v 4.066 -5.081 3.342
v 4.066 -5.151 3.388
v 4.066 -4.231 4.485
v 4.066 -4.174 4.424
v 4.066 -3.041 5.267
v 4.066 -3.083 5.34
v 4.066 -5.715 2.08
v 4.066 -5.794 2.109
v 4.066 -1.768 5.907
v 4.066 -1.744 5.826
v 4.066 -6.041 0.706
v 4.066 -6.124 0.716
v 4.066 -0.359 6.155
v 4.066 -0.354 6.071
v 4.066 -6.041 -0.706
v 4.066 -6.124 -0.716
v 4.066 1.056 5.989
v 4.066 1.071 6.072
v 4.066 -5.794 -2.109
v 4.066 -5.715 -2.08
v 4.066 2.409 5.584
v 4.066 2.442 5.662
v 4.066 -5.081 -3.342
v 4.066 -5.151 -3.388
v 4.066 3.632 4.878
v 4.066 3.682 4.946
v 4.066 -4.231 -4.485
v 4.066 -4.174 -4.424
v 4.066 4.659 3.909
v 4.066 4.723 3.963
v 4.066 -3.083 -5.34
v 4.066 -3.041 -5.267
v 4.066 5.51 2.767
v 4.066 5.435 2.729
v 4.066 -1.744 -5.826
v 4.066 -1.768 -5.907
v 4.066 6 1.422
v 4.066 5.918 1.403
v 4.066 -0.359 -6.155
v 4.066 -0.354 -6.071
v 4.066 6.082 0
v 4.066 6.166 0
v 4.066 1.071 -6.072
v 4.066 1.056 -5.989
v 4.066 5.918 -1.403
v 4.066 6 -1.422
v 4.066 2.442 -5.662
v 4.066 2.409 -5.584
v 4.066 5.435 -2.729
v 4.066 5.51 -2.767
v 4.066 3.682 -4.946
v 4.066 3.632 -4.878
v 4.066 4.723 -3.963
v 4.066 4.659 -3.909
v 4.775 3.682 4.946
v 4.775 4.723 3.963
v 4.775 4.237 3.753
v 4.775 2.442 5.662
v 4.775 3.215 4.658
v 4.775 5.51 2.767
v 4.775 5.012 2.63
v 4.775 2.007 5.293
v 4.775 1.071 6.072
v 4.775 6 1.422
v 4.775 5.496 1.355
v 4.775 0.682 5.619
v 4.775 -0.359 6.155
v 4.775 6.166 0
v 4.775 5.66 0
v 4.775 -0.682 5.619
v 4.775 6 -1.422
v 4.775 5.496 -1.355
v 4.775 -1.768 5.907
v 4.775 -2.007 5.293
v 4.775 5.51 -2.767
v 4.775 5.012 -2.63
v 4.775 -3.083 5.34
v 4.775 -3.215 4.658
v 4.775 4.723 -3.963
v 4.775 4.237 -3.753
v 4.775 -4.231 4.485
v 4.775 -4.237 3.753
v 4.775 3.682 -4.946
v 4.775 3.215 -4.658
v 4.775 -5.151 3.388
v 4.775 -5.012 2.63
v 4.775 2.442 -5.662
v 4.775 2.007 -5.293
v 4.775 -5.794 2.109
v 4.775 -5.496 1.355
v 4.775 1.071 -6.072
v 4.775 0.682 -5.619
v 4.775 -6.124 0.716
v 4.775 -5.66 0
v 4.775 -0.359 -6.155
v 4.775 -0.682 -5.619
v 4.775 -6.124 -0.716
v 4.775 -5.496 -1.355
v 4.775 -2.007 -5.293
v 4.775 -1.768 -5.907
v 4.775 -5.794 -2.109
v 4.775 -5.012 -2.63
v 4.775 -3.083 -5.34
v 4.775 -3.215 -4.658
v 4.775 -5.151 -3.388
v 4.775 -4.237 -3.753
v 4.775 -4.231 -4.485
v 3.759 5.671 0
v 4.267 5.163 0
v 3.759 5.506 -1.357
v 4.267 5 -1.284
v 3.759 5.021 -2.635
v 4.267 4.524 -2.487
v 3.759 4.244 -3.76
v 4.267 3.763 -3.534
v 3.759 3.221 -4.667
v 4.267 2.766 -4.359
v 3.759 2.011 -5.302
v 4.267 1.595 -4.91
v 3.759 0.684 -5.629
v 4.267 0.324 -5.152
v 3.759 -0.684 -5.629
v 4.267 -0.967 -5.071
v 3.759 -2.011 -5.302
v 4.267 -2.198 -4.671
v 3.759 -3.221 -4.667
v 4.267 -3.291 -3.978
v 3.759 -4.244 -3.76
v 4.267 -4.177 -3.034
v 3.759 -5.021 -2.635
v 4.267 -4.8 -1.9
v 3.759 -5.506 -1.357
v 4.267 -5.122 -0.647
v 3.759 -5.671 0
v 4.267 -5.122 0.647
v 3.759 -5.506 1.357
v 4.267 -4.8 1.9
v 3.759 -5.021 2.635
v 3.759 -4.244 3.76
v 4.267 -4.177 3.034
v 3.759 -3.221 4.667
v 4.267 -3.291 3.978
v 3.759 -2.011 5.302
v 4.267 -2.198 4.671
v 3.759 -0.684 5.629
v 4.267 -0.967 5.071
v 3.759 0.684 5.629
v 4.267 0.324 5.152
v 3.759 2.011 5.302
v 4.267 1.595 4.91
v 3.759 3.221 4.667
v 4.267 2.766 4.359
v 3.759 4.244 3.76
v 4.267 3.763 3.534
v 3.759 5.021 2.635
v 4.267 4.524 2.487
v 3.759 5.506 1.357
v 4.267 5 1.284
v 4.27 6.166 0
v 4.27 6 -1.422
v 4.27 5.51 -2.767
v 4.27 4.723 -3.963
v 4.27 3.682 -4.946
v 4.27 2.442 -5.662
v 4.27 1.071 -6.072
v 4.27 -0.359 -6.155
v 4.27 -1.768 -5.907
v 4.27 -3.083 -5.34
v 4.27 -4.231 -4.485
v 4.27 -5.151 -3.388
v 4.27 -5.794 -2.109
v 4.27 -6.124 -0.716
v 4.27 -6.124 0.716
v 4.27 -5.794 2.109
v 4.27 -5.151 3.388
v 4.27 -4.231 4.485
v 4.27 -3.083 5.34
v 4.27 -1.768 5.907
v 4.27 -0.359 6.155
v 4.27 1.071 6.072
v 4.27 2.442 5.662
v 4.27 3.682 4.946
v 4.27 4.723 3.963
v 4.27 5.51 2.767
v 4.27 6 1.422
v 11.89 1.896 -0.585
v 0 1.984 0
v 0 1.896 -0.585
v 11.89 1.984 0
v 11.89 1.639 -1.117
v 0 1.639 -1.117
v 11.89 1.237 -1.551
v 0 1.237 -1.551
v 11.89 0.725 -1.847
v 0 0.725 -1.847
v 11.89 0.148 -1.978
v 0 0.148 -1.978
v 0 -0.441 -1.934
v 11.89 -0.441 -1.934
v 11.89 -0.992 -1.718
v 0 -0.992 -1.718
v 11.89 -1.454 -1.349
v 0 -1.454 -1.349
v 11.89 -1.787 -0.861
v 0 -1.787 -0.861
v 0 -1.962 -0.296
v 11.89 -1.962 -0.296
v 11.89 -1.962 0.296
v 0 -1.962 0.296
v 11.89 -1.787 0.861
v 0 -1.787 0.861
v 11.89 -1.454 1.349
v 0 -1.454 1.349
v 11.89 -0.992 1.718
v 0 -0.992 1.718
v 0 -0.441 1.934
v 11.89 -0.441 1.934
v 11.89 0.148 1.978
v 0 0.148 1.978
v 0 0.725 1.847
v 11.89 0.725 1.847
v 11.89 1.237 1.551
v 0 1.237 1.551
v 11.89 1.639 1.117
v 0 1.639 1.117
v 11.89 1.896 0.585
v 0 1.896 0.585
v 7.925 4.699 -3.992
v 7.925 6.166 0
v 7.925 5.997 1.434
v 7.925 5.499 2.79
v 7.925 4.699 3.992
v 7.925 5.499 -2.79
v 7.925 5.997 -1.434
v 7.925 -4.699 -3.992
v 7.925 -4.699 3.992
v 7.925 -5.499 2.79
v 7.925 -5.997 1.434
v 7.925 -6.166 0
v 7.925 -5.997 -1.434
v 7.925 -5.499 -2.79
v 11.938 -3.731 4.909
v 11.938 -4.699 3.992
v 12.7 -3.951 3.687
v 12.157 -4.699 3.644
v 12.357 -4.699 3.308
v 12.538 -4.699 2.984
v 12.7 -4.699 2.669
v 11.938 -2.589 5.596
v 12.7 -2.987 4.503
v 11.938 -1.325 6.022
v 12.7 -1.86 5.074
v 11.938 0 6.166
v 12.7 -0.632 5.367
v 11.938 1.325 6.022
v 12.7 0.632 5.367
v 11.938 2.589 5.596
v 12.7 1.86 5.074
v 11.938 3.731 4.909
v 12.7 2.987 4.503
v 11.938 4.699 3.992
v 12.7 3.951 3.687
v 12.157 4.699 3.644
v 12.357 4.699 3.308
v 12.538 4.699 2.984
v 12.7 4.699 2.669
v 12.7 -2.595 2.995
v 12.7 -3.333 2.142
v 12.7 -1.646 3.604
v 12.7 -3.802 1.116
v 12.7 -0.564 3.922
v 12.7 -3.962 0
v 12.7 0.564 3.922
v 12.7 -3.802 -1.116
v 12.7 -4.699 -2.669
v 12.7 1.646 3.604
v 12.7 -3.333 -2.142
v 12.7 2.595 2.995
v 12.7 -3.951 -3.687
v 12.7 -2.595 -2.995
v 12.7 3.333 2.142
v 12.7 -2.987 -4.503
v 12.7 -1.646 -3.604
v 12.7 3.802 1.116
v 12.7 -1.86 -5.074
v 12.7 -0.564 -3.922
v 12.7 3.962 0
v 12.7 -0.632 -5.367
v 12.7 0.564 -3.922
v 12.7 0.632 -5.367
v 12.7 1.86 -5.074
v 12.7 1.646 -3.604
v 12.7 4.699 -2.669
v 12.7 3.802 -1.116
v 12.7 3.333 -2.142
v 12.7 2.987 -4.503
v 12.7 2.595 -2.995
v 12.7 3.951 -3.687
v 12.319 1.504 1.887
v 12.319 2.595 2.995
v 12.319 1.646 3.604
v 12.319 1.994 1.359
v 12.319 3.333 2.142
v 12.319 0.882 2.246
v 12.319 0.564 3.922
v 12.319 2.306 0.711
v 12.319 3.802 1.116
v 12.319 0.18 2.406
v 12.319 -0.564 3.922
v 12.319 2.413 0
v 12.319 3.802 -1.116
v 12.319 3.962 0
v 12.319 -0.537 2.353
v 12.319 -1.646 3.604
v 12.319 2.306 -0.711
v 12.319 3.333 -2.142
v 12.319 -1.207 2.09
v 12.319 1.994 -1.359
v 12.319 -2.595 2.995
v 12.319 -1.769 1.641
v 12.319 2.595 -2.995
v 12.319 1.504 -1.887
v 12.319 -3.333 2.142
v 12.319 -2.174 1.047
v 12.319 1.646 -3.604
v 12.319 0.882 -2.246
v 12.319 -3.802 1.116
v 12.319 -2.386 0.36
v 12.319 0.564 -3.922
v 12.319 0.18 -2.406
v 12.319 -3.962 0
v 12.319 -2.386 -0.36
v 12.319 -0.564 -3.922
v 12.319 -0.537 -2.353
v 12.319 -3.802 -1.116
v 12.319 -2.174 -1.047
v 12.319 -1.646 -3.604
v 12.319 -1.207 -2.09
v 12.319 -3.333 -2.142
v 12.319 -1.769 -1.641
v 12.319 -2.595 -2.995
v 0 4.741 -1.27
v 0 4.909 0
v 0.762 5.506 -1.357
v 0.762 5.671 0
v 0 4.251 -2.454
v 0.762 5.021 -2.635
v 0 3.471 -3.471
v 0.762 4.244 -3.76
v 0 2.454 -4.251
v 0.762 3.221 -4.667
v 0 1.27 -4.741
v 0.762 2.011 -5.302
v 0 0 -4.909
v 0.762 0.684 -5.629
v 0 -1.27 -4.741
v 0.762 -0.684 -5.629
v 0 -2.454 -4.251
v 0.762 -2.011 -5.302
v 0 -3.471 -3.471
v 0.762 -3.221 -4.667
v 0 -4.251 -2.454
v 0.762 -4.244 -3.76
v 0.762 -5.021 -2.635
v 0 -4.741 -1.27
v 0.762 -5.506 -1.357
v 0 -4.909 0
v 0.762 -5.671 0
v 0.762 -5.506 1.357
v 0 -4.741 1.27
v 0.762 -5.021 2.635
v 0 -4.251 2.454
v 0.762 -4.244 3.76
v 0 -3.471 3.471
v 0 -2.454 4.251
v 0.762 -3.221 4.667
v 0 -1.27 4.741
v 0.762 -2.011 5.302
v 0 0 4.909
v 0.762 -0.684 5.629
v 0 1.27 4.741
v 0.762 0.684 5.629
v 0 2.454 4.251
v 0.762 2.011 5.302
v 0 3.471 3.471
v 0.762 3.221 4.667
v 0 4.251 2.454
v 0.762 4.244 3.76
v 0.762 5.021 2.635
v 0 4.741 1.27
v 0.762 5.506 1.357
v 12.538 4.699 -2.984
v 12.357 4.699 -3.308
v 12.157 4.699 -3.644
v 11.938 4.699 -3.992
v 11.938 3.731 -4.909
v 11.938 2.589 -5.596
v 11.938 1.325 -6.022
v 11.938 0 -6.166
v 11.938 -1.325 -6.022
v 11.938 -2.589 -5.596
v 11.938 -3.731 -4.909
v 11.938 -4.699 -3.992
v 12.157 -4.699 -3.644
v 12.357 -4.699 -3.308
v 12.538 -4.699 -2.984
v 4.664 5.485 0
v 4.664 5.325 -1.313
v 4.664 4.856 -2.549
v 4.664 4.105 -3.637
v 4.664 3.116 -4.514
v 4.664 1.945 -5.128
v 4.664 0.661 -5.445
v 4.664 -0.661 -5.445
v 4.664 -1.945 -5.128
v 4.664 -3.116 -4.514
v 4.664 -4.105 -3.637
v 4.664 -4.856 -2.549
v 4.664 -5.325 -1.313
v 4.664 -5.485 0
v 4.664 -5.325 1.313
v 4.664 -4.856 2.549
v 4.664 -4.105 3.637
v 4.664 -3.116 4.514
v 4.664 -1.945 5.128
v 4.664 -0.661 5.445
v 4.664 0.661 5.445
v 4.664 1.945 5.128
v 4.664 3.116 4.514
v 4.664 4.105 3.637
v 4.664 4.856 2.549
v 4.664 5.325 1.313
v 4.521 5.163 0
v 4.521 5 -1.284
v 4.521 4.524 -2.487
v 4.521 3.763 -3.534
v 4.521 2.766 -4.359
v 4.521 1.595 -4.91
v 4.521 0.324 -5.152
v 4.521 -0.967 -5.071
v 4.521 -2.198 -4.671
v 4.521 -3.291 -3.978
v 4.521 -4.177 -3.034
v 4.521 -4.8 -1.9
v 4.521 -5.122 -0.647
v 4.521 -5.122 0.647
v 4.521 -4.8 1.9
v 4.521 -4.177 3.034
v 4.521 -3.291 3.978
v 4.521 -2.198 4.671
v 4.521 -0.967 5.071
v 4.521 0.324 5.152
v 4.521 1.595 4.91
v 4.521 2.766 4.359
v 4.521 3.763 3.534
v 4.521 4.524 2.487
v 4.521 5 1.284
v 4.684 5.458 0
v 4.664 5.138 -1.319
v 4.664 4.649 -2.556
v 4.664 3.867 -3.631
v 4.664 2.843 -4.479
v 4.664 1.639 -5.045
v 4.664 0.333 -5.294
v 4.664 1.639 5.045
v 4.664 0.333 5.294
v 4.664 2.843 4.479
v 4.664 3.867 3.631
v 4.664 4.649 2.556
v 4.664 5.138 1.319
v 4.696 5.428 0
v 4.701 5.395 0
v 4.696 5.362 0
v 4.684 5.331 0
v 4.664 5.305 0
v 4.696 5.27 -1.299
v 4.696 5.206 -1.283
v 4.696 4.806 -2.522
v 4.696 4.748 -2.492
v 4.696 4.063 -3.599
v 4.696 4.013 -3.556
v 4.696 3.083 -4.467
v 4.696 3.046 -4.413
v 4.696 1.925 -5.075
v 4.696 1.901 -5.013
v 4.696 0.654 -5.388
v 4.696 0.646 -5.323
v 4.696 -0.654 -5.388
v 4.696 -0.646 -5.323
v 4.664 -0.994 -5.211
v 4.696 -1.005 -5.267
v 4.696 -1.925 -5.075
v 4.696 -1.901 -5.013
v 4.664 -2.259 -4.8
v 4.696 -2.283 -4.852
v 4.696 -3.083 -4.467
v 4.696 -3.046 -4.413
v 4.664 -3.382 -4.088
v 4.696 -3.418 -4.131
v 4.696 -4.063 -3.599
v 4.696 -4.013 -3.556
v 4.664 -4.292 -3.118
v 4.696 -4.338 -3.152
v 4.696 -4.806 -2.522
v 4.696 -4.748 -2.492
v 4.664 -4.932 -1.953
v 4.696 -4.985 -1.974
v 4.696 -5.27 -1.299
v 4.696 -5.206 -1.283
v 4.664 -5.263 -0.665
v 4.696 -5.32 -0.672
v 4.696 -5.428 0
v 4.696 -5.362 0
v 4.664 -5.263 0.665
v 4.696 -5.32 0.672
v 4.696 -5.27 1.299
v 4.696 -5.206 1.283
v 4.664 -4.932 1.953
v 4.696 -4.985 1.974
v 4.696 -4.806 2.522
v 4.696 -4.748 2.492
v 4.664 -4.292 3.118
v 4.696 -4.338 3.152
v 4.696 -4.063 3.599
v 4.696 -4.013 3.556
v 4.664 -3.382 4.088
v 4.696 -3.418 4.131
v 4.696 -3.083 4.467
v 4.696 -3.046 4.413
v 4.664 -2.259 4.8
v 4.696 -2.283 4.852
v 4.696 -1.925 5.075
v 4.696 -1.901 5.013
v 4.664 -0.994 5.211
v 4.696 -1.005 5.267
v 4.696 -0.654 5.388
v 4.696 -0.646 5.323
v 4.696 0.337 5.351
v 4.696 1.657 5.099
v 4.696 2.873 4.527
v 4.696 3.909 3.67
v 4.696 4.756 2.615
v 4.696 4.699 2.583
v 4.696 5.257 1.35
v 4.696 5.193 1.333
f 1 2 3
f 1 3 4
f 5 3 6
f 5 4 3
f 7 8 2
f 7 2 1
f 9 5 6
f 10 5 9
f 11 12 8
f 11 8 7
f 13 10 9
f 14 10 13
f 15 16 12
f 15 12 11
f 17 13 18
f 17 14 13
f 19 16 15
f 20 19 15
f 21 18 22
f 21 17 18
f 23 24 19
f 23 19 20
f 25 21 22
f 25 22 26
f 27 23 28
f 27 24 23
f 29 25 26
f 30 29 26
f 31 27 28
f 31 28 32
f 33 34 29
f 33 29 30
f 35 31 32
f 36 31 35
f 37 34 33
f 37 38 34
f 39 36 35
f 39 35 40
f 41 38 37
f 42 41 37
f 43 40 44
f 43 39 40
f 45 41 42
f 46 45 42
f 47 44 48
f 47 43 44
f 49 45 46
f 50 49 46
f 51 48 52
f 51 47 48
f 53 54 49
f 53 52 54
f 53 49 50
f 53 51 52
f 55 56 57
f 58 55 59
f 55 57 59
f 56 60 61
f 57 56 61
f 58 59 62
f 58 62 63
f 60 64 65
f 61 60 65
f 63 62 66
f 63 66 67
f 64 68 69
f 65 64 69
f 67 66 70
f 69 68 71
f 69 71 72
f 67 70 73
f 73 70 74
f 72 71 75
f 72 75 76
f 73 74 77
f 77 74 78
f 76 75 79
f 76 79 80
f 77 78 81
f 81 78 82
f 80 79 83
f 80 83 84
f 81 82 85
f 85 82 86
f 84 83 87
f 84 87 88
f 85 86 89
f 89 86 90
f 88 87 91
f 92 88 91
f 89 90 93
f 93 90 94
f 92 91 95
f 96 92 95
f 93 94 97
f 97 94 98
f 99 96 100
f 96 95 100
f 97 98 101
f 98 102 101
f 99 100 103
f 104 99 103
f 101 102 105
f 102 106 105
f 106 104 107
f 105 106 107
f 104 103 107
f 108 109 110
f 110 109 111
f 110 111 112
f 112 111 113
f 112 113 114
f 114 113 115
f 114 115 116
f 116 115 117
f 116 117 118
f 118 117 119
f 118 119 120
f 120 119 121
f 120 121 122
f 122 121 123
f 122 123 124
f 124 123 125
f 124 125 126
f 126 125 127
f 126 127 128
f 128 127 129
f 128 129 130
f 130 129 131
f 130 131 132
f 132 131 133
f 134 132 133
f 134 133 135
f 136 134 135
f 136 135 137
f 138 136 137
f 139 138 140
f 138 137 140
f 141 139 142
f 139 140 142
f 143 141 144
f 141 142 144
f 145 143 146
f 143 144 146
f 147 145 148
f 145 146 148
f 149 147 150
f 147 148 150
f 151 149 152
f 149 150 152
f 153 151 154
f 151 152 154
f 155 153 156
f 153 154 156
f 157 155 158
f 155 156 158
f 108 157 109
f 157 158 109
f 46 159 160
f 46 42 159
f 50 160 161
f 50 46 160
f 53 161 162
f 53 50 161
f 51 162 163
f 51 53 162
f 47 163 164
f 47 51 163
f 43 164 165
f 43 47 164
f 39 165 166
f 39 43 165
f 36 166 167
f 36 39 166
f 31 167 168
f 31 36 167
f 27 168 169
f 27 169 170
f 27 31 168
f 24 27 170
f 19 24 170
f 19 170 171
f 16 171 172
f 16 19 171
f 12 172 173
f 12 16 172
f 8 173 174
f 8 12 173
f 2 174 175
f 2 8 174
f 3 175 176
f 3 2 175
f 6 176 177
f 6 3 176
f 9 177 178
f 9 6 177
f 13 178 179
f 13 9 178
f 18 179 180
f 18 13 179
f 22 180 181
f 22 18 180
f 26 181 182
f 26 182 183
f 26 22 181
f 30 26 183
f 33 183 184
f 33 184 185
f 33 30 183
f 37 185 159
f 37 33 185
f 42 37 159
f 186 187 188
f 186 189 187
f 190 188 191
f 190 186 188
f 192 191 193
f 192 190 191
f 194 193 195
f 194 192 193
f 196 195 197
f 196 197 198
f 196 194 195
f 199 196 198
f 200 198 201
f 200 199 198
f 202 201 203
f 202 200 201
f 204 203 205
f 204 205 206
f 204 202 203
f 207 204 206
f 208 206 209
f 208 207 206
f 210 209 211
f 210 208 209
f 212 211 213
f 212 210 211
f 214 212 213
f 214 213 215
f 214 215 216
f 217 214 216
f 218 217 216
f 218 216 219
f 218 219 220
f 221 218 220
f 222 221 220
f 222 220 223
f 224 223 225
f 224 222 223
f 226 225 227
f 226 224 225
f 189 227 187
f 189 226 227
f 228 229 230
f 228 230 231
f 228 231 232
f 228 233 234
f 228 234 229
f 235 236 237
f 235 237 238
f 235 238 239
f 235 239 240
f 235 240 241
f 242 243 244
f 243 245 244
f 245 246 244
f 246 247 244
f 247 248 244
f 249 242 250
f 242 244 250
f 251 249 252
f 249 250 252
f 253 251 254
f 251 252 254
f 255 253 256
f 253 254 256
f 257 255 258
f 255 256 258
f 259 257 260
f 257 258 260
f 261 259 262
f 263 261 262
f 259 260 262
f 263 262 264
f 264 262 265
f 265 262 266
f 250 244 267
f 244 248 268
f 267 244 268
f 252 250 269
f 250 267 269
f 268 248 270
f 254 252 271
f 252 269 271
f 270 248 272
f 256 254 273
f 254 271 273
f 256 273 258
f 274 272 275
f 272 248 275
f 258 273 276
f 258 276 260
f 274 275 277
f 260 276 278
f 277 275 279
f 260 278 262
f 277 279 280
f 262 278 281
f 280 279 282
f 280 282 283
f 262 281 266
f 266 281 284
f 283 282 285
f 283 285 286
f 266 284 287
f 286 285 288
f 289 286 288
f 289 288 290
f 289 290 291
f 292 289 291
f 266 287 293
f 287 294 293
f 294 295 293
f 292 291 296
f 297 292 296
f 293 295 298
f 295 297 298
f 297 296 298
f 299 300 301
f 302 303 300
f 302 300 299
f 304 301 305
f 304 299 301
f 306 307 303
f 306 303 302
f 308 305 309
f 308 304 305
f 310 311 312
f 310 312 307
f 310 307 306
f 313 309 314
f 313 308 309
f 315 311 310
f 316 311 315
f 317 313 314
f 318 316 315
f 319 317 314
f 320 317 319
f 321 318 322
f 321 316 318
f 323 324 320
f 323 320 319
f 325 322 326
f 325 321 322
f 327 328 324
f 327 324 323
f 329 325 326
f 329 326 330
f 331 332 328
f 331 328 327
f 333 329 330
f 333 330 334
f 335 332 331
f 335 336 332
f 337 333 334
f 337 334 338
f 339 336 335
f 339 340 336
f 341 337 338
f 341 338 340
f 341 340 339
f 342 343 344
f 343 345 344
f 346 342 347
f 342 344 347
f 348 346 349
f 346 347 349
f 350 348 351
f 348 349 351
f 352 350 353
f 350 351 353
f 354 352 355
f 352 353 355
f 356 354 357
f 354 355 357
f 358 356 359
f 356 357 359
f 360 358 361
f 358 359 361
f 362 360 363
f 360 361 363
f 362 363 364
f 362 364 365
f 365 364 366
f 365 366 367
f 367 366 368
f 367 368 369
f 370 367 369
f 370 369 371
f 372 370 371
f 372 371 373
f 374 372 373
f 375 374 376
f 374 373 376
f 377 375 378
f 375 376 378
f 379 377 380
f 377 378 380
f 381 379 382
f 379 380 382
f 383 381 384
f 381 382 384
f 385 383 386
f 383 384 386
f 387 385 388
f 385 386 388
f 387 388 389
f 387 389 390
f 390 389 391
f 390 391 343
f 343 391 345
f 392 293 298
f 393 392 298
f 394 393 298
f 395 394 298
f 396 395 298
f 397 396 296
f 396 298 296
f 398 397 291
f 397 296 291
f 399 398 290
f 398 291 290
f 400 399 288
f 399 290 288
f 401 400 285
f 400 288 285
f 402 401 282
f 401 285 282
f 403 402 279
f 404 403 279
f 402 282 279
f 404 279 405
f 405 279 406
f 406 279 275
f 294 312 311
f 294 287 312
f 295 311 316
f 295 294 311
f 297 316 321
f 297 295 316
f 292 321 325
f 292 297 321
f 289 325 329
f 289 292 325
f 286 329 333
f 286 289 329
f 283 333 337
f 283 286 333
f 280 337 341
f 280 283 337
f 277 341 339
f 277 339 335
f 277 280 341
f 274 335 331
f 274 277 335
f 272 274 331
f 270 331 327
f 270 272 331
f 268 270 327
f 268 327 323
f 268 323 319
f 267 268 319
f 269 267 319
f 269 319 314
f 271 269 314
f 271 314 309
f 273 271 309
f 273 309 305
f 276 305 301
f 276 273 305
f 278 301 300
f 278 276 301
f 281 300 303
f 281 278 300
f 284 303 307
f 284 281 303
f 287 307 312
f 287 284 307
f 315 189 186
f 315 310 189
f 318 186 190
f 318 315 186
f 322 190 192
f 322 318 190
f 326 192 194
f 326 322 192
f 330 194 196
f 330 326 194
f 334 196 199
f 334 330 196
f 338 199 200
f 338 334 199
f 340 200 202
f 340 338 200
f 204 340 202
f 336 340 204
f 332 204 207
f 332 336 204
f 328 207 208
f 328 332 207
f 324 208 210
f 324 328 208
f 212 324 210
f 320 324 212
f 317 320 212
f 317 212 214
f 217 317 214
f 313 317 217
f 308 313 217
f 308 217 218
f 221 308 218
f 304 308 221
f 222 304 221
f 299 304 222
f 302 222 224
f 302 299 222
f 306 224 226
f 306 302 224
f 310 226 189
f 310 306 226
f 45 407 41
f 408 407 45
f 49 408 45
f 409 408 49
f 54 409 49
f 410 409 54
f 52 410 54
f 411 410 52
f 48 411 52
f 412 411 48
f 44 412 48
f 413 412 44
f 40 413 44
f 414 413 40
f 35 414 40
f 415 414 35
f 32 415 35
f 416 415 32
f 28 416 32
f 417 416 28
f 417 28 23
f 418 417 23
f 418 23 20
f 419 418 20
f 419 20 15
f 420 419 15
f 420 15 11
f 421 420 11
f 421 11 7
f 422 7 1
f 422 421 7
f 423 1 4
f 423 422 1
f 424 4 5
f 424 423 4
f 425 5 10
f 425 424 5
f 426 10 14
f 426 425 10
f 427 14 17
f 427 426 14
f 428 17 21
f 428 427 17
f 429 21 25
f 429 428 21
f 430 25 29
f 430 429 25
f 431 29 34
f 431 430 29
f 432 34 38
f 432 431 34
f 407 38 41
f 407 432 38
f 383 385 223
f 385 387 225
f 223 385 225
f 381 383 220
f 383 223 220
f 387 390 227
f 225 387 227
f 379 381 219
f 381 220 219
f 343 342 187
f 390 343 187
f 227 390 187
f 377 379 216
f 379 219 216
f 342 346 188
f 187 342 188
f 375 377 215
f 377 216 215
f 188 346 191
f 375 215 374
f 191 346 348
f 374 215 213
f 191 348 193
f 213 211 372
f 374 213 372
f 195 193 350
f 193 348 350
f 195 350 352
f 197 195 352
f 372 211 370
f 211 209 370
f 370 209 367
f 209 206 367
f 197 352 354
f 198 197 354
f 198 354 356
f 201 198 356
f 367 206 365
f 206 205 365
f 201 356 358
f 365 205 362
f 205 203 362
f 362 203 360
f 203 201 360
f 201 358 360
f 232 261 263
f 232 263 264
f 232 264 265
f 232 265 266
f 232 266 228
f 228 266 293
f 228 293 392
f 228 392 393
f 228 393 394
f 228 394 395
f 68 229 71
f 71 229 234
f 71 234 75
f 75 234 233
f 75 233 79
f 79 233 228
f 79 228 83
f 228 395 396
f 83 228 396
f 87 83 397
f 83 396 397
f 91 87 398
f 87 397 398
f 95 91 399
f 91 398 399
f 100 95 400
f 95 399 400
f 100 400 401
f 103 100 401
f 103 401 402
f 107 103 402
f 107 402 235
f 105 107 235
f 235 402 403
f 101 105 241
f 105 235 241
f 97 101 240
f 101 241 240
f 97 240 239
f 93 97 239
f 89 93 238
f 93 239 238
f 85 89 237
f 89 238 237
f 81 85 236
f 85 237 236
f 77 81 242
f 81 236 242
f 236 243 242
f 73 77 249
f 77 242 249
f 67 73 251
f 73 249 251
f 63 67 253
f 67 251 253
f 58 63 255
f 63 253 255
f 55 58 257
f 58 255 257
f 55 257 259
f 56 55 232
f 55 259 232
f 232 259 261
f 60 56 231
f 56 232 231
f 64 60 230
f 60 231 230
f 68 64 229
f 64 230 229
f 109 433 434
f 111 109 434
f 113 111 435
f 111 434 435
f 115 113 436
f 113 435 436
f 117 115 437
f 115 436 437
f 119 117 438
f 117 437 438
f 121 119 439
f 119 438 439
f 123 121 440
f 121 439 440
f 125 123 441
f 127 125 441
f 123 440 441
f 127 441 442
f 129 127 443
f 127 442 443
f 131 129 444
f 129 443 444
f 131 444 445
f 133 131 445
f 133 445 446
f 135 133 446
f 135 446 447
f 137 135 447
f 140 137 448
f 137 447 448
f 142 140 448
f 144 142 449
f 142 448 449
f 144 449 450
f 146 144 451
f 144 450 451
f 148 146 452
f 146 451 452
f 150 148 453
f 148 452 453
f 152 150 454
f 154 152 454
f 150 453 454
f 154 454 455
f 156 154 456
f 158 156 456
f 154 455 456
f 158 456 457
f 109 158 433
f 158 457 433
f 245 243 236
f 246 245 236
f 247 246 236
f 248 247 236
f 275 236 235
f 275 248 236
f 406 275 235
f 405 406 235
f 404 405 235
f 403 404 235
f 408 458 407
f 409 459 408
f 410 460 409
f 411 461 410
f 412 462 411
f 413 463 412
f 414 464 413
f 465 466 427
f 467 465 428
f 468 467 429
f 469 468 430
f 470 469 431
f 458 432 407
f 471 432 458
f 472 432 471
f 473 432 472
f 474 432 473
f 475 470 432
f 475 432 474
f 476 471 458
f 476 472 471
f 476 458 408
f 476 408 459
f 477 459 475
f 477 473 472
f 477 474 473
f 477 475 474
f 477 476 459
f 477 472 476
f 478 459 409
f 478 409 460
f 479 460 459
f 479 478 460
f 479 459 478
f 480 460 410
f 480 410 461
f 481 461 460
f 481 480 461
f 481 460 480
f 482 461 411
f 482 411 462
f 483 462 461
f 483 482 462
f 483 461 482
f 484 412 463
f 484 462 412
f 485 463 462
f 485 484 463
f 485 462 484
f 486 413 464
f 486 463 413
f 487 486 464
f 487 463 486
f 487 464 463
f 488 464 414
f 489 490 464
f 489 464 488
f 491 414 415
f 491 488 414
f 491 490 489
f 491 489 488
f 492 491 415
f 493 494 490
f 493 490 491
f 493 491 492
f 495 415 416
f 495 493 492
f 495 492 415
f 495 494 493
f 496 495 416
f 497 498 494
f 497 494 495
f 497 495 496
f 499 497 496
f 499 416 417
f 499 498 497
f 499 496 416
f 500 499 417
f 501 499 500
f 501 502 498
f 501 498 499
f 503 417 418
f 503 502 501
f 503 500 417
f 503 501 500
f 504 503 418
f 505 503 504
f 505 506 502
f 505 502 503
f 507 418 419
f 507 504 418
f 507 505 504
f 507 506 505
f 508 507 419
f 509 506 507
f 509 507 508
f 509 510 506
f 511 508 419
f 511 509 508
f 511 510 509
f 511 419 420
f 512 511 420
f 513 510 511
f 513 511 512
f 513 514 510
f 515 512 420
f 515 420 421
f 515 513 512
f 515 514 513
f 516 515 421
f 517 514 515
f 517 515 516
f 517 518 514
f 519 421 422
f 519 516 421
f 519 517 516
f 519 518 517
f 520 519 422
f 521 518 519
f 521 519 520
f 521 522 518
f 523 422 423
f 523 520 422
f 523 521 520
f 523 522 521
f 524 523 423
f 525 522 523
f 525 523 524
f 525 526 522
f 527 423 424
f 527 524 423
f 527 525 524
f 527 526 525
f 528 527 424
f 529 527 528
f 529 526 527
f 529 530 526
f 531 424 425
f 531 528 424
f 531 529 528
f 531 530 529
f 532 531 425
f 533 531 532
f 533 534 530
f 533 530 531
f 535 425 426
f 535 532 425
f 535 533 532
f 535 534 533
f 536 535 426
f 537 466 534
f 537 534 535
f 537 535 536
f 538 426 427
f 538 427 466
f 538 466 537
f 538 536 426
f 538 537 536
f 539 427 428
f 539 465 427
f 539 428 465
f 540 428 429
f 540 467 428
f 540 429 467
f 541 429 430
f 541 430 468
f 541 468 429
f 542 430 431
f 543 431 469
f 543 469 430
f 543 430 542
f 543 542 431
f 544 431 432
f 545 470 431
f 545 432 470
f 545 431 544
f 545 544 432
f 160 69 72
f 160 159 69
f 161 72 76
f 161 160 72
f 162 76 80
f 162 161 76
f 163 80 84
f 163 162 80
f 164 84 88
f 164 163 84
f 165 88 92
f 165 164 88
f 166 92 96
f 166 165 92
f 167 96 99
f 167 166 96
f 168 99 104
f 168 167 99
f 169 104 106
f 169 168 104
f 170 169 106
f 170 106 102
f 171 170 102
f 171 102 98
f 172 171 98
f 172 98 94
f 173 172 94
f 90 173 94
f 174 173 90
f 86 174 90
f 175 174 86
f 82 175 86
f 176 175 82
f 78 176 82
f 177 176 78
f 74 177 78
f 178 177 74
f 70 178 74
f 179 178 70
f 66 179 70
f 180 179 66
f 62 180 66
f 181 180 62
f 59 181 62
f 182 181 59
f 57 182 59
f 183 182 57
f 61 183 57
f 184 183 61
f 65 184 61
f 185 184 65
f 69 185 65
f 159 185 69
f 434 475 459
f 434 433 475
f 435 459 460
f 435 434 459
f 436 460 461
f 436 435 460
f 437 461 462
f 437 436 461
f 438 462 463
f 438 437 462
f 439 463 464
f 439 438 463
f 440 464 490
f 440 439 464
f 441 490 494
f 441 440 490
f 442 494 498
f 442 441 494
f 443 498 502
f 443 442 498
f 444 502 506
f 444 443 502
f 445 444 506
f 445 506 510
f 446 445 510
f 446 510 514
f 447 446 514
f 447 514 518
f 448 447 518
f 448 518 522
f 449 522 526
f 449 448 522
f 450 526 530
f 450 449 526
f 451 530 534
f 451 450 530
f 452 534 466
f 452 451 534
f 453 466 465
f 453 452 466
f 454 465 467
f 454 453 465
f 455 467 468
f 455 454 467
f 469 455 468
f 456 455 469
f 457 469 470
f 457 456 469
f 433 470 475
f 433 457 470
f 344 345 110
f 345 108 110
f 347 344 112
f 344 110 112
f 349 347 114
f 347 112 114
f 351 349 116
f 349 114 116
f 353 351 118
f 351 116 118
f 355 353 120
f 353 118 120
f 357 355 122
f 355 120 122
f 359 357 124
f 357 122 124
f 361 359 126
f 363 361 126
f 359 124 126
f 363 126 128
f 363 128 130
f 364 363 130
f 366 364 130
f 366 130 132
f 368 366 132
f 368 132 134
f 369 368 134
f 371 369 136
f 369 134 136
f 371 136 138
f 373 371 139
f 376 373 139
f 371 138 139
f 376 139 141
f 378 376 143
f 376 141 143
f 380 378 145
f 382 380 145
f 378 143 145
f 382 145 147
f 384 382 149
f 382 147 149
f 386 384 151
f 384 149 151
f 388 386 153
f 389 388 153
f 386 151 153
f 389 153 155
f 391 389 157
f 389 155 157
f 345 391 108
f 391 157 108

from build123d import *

# Parameters (mm, degrees)
SKETCH2_W          = 0.381
SKETCH2_H          = 3.9624
SKETCH4_W          = 49.3268
SKETCH4_H          = 24.6634
SKETCH4_W_2        = 24.6634
SKETCH4_H_2        = 9.398
CUT_EXTRUDE1_DEPTH = 4.7752


with BuildPart() as part:
    # Sketch1 → Revolve1 (revolve)
    with BuildSketch(Plane.XY):
        Polygon((0, 0), (0, 4.90855), (0.762, 5.67055), (3.7592, 5.67055), (4.2672, 5.16255), (4.7752, 5.16255), (4.7752, 6.16585), (11.938, 6.16585), (12.7, 5.40385), (12.7, 0), align=None)
    revolve(axis=Axis((12.7, 0, 0), (-1, 0, 0)))

    # Sketch2 → Cut-Revolve1 (revolve, cut)
    with BuildSketch(Plane.XY):
        with Locations((12.5095, 1.9812)):
            Rectangle(SKETCH2_W, SKETCH2_H)
    revolve(axis=Axis((12.7, 0, 0), (-1, 0, 0)), mode=Mode.SUBTRACT)

    # Sketch3 → Cut-Revolve2 (revolve, cut)
    with BuildSketch(Plane.XY):
        Polygon((0, 0), (0, 1.98374), (11.88974, 1.98374), (12.319, 2.413), (12.319, 0), align=None)
    revolve(axis=Axis((12.319, 0, 0), (-1, 0, 0)), mode=Mode.SUBTRACT)

    # Sketch4 → Cut-Extrude1 (cut)
    with BuildSketch(Plane(origin=(12.7, 0, 0), x_dir=(0, 0, -1), z_dir=(1, 0, 0))):
        Rectangle(SKETCH4_W, SKETCH4_H)
        Rectangle(SKETCH4_W_2, SKETCH4_H_2, mode=Mode.SUBTRACT)
    extrude(amount=-CUT_EXTRUDE1_DEPTH, mode=Mode.SUBTRACT)

    # Sketch5 → Revolve2 (revolve)
    with BuildSketch(Plane.XY):
        with BuildLine():
            Line((4.066488686, 6.16585), (4.066488686, 6.081681804))
            Line((4.066488686, 6.081681804), (4.663607684, 5.484562806))
            ThreePointArc((4.663607684, 5.484562806), (4.700805122, 5.394760245), (4.663607684, 5.304957684))
            Line((4.663607684, 5.304957684), (4.5212, 5.16255))
            Line((4.5212, 5.16255), (4.2672, 5.16255))
            Line((4.2672, 5.16255), (4.2672, 4.90855))
            Line((4.2672, 4.90855), (4.7752, 4.90855))
            Line((4.7752, 4.90855), (4.7752, 5.660338686))
            Line((4.7752, 5.660338686), (4.269688686, 6.16585))
            Line((4.269688686, 6.16585), (4.066488686, 6.16585))
        make_face()
    revolve(axis=Axis((4.7752, 0, 0), (-1, 0, 0)))


solid = part.part
